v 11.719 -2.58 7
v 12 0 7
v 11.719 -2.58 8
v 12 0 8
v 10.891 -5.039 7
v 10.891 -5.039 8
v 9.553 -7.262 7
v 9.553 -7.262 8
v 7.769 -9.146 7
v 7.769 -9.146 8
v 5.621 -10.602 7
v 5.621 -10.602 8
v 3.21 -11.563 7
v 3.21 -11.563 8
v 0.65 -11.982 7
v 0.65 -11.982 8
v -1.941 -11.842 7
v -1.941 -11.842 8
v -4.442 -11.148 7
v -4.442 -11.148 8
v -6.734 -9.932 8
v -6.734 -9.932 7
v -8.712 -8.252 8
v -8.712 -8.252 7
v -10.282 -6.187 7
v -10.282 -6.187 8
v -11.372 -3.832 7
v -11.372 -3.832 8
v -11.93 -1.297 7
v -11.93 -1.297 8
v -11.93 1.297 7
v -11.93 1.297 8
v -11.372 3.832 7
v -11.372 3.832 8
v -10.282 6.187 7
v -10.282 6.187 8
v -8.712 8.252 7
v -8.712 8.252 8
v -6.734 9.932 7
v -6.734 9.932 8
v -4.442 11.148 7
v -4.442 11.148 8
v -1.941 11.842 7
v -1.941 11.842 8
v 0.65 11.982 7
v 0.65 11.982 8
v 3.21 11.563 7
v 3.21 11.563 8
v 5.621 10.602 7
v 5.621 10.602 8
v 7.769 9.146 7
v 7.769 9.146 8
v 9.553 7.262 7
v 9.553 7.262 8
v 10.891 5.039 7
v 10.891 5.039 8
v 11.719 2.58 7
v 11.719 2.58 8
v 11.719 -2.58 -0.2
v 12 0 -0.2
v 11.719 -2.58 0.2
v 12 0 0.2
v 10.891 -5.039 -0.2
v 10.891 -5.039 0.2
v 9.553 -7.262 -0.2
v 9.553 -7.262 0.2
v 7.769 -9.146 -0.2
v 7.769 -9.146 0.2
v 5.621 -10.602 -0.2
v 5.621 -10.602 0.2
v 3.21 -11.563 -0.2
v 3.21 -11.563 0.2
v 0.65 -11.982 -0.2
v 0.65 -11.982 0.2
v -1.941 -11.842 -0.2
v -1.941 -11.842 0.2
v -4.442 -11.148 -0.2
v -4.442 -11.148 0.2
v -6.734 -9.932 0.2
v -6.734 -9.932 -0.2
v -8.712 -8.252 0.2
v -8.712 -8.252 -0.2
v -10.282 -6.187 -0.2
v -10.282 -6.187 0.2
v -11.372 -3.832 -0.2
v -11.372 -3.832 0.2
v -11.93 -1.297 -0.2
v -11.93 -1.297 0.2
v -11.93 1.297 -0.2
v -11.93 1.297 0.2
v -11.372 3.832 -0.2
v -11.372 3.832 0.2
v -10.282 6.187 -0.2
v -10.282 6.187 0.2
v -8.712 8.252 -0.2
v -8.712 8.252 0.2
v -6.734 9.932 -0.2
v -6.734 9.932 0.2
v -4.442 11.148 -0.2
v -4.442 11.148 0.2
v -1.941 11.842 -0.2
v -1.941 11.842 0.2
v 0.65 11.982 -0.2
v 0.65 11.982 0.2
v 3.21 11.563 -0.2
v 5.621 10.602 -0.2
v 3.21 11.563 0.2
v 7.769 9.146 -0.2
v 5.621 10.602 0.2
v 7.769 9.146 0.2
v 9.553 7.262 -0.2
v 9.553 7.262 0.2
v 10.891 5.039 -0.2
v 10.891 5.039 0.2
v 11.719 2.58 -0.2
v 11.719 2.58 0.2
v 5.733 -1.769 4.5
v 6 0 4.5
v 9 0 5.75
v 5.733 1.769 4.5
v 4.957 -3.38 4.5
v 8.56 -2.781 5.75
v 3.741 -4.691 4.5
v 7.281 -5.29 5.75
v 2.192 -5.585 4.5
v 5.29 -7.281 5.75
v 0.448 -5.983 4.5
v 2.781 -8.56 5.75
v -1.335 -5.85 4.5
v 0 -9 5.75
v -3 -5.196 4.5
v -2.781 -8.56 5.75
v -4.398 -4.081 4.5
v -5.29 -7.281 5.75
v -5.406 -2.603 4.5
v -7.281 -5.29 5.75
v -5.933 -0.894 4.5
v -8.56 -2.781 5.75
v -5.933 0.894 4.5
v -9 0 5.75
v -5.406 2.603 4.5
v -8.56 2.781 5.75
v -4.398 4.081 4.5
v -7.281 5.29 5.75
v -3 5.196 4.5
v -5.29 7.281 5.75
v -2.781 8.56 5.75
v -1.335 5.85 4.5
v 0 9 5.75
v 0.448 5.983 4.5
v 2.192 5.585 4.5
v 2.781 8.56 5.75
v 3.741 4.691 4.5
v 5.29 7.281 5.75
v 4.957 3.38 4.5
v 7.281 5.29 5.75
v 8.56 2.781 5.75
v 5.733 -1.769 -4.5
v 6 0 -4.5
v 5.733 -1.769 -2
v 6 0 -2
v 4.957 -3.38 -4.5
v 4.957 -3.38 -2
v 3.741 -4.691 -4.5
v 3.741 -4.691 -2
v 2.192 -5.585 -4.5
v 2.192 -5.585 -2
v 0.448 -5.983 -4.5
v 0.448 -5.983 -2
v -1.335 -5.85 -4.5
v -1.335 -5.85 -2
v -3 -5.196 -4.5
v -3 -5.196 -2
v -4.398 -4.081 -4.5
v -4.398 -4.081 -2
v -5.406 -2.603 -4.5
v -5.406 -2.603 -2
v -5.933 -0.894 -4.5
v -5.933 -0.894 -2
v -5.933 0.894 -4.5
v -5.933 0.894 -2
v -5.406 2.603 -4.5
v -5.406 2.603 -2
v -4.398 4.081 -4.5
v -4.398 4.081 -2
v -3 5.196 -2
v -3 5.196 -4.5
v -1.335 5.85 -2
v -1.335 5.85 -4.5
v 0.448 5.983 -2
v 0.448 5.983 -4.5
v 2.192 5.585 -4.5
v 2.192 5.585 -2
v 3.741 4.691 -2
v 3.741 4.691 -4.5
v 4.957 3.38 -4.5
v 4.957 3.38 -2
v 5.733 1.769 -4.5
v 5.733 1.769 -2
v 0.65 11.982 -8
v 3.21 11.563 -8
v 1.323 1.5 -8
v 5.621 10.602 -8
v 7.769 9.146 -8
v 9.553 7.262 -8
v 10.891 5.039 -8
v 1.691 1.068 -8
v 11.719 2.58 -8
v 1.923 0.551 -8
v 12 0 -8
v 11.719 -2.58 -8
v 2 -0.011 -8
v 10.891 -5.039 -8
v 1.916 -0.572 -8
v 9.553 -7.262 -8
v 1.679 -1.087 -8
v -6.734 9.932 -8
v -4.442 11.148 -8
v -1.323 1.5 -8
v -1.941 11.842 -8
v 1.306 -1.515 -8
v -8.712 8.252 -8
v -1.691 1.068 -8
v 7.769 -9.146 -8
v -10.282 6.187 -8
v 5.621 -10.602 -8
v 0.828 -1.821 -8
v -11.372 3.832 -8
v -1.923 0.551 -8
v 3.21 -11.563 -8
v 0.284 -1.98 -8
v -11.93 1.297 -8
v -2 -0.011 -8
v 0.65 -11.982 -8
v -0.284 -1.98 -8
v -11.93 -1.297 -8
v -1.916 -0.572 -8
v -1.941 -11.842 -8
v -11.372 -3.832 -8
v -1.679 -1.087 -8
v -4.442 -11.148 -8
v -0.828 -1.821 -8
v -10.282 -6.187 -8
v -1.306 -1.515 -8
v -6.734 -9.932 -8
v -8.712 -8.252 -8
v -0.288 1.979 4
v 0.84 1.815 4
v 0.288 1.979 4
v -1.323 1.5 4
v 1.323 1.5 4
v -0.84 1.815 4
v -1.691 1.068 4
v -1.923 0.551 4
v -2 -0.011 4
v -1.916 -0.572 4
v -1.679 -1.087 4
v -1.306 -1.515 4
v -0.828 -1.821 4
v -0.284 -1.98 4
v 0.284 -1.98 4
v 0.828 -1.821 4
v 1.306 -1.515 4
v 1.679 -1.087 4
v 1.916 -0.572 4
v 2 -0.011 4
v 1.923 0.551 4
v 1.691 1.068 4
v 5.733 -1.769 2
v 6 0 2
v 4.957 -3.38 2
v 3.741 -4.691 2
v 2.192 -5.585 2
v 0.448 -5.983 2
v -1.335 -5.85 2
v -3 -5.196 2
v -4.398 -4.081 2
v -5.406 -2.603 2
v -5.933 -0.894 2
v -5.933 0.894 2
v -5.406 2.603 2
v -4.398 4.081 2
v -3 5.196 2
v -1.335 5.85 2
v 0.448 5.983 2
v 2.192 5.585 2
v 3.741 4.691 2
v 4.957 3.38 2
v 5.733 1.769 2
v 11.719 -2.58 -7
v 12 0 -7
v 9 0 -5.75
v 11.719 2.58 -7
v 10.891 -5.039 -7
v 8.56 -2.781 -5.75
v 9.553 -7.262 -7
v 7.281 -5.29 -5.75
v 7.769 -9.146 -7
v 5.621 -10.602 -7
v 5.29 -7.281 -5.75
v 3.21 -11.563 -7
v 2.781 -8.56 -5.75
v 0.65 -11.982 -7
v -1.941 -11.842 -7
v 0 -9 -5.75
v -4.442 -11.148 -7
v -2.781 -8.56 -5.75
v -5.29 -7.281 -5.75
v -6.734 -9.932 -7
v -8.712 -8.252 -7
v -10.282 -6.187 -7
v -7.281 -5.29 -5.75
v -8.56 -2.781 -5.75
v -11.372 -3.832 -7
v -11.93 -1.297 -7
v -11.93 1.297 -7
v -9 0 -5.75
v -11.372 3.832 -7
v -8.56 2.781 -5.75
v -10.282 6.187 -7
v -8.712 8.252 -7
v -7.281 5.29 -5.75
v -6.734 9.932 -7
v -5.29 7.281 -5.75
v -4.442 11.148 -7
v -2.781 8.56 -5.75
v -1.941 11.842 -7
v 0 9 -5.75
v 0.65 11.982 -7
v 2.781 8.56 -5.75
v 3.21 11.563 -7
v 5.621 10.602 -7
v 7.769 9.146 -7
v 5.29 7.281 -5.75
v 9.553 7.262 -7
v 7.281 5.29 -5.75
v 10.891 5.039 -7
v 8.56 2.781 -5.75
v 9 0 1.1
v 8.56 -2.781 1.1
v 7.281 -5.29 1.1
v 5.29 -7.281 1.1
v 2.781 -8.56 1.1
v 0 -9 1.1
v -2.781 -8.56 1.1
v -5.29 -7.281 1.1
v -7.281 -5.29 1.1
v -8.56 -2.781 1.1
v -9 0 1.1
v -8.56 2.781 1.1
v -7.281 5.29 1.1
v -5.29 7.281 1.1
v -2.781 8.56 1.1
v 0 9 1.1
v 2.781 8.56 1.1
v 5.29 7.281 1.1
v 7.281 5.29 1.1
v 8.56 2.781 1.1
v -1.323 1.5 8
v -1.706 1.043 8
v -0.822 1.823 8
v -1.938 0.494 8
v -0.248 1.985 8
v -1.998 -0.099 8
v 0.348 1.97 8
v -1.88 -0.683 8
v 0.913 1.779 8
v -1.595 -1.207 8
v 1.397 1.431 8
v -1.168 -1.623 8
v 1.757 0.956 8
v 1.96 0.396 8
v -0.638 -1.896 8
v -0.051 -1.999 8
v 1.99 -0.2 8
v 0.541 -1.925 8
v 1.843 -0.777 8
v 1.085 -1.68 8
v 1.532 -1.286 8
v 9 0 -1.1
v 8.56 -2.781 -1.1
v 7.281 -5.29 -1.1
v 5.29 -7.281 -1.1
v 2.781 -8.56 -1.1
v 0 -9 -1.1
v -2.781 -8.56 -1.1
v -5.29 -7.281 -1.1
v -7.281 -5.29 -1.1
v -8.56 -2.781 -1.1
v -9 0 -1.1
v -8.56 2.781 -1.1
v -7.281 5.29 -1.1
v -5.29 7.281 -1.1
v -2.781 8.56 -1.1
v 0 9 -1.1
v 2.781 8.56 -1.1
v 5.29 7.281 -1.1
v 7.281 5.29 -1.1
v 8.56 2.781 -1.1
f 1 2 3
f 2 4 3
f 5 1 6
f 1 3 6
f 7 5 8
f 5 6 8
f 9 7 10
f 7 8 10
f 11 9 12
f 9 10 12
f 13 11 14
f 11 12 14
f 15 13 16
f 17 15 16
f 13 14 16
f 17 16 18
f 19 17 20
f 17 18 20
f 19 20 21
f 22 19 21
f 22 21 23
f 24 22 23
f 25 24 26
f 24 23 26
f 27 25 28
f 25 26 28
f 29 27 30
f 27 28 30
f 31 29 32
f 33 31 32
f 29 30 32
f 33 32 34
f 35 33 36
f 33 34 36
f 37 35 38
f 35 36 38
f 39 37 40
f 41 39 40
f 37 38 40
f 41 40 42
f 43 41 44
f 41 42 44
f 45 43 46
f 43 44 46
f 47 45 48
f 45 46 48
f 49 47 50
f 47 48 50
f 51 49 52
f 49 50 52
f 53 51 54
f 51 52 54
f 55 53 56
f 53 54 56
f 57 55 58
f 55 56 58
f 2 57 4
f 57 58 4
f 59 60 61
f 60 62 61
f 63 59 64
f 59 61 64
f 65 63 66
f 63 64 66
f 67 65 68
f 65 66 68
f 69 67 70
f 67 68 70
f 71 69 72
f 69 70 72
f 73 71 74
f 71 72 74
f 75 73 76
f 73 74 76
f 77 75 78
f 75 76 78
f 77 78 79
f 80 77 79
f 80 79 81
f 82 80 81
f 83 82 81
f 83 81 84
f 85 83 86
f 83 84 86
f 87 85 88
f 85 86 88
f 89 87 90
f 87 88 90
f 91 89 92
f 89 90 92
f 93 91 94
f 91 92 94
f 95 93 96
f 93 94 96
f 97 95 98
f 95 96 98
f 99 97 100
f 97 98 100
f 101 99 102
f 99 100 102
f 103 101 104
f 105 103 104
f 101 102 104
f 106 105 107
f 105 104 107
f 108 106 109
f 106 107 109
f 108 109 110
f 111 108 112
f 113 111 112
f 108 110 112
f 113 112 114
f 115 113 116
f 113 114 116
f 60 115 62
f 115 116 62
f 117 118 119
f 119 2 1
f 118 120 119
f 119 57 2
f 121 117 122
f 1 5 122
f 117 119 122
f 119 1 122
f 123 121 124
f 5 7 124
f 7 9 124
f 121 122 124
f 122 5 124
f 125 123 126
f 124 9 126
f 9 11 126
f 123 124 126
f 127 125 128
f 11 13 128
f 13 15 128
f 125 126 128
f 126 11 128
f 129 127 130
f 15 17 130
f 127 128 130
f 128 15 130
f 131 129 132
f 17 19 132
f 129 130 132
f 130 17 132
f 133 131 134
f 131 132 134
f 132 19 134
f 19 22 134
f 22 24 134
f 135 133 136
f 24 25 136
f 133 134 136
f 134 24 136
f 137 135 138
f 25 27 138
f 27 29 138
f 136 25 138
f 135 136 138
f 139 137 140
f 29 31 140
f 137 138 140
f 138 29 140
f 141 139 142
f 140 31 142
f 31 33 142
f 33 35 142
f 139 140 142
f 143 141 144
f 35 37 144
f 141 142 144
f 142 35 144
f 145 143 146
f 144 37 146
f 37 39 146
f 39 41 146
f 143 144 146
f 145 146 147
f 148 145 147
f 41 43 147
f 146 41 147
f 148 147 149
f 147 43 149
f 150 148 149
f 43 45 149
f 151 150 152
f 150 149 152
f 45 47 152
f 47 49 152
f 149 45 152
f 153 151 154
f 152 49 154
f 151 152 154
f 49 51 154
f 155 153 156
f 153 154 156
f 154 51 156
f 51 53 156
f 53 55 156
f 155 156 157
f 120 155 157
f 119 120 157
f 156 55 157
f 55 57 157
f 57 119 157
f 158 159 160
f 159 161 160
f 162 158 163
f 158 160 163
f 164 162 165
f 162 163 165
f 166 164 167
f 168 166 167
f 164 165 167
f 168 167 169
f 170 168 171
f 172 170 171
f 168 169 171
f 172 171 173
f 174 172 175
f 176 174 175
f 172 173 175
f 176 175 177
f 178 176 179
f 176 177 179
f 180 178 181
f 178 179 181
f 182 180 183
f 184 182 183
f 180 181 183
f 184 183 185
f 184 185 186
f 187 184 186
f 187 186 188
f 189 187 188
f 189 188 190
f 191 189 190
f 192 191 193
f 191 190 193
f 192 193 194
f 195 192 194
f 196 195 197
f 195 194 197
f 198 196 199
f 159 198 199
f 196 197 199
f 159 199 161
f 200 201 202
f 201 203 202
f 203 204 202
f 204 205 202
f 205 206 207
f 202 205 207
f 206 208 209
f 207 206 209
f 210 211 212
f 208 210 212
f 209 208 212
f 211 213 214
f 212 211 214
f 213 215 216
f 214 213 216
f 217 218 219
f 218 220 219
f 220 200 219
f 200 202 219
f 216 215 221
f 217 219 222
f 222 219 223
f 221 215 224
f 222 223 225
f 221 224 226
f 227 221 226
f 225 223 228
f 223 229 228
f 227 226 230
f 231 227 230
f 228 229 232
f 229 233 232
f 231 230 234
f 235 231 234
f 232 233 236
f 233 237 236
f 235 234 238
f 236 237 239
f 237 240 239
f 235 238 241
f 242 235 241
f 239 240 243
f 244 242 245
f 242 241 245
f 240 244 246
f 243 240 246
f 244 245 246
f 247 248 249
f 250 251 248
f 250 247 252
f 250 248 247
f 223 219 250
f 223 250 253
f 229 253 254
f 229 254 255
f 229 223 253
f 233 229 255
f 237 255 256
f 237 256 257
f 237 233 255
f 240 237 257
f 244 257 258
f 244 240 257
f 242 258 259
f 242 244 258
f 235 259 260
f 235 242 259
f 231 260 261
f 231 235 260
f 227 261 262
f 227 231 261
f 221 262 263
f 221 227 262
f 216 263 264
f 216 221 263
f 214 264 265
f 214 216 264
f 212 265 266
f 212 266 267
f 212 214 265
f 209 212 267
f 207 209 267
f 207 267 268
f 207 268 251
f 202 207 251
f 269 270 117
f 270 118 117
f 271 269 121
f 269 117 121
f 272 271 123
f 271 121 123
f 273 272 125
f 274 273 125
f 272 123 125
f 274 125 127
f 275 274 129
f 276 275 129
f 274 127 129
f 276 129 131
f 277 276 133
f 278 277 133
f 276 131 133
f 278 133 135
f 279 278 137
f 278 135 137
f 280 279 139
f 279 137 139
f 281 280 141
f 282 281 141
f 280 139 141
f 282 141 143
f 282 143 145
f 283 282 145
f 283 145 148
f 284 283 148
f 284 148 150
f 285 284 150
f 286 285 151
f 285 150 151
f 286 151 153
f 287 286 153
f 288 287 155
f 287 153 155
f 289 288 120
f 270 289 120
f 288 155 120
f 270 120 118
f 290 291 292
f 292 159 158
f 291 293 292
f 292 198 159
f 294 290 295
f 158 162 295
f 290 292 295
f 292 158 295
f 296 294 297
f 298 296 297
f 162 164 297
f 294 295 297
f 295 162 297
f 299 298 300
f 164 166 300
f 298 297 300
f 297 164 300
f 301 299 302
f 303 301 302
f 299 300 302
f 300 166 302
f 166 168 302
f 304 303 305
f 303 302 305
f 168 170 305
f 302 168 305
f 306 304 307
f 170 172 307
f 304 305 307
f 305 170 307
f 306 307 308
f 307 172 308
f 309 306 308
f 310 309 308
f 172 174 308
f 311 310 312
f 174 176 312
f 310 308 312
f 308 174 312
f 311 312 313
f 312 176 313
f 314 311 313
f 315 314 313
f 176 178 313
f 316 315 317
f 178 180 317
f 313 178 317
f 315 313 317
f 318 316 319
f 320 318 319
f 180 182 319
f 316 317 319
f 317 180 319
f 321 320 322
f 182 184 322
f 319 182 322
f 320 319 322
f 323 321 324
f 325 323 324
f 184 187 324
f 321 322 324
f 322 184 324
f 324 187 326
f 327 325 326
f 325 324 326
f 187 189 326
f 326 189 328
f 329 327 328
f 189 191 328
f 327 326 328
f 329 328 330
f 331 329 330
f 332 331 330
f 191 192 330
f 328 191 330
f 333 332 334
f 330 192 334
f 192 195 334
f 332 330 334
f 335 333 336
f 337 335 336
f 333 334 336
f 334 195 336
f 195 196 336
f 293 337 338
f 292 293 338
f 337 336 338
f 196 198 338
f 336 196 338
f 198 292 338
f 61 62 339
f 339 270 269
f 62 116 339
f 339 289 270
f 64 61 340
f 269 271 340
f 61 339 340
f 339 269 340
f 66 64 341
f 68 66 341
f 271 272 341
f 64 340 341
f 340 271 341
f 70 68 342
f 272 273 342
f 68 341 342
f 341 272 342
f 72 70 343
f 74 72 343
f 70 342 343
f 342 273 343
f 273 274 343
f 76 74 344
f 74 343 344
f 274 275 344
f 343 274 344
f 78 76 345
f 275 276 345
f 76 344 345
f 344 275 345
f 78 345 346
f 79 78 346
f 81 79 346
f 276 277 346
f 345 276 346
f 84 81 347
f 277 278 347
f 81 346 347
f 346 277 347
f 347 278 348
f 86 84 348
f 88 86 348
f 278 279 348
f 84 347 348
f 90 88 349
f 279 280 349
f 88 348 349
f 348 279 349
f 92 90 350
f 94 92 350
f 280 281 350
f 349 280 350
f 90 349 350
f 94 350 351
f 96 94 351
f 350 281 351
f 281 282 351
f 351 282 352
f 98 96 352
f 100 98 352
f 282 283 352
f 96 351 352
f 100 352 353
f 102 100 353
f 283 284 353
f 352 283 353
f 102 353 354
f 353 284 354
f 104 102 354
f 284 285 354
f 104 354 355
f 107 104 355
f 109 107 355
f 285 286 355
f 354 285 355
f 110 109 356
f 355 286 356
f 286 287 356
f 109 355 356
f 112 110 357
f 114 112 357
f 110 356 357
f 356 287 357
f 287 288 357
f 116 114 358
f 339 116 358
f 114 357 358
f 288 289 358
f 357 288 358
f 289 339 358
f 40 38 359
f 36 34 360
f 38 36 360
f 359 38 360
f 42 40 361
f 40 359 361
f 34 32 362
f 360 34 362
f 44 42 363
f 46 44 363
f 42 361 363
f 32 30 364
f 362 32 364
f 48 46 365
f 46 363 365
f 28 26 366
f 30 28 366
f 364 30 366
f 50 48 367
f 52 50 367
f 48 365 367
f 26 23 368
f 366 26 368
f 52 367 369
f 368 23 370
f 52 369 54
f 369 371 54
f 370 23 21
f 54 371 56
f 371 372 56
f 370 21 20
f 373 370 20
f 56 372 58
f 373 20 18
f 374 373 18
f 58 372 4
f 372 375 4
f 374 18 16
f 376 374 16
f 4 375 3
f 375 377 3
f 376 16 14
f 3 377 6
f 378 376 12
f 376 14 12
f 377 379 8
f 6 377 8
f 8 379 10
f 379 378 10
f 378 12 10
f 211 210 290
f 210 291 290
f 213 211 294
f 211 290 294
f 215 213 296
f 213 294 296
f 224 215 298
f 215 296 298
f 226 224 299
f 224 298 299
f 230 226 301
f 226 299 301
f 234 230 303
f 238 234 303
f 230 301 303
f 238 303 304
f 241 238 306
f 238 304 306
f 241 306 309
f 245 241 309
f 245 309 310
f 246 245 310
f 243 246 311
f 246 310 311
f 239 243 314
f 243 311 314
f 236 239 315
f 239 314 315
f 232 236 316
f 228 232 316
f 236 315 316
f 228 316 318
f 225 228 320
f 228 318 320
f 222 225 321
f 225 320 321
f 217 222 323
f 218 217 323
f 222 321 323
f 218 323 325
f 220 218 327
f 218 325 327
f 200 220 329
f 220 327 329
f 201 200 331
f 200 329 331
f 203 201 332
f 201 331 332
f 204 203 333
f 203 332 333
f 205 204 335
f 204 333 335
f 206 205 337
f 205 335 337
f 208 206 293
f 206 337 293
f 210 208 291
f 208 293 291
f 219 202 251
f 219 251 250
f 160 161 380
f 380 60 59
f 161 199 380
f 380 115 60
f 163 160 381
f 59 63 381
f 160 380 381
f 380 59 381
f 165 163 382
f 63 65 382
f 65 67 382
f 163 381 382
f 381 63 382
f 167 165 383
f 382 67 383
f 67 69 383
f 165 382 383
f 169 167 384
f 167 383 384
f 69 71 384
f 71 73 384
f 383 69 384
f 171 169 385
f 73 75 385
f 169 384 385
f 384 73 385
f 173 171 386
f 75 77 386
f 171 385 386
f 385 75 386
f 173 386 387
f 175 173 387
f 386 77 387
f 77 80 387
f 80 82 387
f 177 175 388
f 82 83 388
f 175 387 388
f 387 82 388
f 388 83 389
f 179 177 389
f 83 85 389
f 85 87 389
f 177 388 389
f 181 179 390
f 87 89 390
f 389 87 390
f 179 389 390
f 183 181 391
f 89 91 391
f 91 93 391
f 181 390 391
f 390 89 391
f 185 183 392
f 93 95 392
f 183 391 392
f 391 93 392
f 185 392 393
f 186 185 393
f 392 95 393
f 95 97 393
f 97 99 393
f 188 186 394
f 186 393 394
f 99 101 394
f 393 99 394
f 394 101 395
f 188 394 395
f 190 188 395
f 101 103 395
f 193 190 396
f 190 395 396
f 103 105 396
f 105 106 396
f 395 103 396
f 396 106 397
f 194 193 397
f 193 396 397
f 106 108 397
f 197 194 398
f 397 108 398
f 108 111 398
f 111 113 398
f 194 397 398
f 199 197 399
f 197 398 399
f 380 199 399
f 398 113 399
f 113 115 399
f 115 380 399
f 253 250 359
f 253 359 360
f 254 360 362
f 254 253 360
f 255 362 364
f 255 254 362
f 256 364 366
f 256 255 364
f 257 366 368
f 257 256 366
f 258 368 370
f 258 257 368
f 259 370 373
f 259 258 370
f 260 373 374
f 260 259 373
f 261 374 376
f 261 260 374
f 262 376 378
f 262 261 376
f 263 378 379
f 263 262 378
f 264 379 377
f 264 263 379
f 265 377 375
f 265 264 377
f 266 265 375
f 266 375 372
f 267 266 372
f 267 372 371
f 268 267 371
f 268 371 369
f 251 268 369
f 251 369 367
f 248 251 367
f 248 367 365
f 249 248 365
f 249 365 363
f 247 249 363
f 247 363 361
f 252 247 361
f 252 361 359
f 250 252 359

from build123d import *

# Parameters (mm, degrees)
CUT_EXTRUDE1_DEPTH = 12
CUT_EXTRUDE2_START = -4
SKETCH4_R          = 2
CUT_EXTRUDE2_DEPTH = 4


with BuildPart() as part:
    # Sketch1 → Revolve1 (revolve)
    with BuildSketch(Plane(origin=(0, 0, 0), x_dir=(0, 0, -1), z_dir=(1, 0, 0)), mode=Mode.PRIVATE) as revolve1_sk:
        Polygon((-8, 0), (8, 0), (8, 12), (7, 12), (4.5, 6), (2, 6), (0.2, 12), (-0.2, 12), (-2, 6), (-4.5, 6), (-7, 12), (-8, 12), align=None)
    revolve(revolve1_sk.sketch.rotate(Axis((0, 0, 8), (0, 0, -1)), 90), axis=Axis((0, 0, 8), (0, 0, -1)))

    # Sketch3 → Cut-Extrude1 (cut)
    with BuildSketch(Plane(origin=(0, 0, -8), x_dir=(-1, 0, 0), z_dir=(0, 0, -1))):
        with BuildLine():
            Line((-1.322875656, 1.5), (1.322875656, 1.5))
            ThreePointArc((1.322875656, 1.5), (0, -2), (-1.322875656, 1.5))
        make_face()
    extrude(amount=-CUT_EXTRUDE1_DEPTH, mode=Mode.SUBTRACT)

    # Sketch4 → Cut-Extrude2 (cut)
    with BuildSketch(Plane.XY.offset(8).offset(CUT_EXTRUDE2_START)):
        with Locations(Location((0, 0, 0), (0, 0, 131.409622109))):
            Circle(SKETCH4_R)
    extrude(amount=CUT_EXTRUDE2_DEPTH, mode=Mode.SUBTRACT)


solid = part.part
